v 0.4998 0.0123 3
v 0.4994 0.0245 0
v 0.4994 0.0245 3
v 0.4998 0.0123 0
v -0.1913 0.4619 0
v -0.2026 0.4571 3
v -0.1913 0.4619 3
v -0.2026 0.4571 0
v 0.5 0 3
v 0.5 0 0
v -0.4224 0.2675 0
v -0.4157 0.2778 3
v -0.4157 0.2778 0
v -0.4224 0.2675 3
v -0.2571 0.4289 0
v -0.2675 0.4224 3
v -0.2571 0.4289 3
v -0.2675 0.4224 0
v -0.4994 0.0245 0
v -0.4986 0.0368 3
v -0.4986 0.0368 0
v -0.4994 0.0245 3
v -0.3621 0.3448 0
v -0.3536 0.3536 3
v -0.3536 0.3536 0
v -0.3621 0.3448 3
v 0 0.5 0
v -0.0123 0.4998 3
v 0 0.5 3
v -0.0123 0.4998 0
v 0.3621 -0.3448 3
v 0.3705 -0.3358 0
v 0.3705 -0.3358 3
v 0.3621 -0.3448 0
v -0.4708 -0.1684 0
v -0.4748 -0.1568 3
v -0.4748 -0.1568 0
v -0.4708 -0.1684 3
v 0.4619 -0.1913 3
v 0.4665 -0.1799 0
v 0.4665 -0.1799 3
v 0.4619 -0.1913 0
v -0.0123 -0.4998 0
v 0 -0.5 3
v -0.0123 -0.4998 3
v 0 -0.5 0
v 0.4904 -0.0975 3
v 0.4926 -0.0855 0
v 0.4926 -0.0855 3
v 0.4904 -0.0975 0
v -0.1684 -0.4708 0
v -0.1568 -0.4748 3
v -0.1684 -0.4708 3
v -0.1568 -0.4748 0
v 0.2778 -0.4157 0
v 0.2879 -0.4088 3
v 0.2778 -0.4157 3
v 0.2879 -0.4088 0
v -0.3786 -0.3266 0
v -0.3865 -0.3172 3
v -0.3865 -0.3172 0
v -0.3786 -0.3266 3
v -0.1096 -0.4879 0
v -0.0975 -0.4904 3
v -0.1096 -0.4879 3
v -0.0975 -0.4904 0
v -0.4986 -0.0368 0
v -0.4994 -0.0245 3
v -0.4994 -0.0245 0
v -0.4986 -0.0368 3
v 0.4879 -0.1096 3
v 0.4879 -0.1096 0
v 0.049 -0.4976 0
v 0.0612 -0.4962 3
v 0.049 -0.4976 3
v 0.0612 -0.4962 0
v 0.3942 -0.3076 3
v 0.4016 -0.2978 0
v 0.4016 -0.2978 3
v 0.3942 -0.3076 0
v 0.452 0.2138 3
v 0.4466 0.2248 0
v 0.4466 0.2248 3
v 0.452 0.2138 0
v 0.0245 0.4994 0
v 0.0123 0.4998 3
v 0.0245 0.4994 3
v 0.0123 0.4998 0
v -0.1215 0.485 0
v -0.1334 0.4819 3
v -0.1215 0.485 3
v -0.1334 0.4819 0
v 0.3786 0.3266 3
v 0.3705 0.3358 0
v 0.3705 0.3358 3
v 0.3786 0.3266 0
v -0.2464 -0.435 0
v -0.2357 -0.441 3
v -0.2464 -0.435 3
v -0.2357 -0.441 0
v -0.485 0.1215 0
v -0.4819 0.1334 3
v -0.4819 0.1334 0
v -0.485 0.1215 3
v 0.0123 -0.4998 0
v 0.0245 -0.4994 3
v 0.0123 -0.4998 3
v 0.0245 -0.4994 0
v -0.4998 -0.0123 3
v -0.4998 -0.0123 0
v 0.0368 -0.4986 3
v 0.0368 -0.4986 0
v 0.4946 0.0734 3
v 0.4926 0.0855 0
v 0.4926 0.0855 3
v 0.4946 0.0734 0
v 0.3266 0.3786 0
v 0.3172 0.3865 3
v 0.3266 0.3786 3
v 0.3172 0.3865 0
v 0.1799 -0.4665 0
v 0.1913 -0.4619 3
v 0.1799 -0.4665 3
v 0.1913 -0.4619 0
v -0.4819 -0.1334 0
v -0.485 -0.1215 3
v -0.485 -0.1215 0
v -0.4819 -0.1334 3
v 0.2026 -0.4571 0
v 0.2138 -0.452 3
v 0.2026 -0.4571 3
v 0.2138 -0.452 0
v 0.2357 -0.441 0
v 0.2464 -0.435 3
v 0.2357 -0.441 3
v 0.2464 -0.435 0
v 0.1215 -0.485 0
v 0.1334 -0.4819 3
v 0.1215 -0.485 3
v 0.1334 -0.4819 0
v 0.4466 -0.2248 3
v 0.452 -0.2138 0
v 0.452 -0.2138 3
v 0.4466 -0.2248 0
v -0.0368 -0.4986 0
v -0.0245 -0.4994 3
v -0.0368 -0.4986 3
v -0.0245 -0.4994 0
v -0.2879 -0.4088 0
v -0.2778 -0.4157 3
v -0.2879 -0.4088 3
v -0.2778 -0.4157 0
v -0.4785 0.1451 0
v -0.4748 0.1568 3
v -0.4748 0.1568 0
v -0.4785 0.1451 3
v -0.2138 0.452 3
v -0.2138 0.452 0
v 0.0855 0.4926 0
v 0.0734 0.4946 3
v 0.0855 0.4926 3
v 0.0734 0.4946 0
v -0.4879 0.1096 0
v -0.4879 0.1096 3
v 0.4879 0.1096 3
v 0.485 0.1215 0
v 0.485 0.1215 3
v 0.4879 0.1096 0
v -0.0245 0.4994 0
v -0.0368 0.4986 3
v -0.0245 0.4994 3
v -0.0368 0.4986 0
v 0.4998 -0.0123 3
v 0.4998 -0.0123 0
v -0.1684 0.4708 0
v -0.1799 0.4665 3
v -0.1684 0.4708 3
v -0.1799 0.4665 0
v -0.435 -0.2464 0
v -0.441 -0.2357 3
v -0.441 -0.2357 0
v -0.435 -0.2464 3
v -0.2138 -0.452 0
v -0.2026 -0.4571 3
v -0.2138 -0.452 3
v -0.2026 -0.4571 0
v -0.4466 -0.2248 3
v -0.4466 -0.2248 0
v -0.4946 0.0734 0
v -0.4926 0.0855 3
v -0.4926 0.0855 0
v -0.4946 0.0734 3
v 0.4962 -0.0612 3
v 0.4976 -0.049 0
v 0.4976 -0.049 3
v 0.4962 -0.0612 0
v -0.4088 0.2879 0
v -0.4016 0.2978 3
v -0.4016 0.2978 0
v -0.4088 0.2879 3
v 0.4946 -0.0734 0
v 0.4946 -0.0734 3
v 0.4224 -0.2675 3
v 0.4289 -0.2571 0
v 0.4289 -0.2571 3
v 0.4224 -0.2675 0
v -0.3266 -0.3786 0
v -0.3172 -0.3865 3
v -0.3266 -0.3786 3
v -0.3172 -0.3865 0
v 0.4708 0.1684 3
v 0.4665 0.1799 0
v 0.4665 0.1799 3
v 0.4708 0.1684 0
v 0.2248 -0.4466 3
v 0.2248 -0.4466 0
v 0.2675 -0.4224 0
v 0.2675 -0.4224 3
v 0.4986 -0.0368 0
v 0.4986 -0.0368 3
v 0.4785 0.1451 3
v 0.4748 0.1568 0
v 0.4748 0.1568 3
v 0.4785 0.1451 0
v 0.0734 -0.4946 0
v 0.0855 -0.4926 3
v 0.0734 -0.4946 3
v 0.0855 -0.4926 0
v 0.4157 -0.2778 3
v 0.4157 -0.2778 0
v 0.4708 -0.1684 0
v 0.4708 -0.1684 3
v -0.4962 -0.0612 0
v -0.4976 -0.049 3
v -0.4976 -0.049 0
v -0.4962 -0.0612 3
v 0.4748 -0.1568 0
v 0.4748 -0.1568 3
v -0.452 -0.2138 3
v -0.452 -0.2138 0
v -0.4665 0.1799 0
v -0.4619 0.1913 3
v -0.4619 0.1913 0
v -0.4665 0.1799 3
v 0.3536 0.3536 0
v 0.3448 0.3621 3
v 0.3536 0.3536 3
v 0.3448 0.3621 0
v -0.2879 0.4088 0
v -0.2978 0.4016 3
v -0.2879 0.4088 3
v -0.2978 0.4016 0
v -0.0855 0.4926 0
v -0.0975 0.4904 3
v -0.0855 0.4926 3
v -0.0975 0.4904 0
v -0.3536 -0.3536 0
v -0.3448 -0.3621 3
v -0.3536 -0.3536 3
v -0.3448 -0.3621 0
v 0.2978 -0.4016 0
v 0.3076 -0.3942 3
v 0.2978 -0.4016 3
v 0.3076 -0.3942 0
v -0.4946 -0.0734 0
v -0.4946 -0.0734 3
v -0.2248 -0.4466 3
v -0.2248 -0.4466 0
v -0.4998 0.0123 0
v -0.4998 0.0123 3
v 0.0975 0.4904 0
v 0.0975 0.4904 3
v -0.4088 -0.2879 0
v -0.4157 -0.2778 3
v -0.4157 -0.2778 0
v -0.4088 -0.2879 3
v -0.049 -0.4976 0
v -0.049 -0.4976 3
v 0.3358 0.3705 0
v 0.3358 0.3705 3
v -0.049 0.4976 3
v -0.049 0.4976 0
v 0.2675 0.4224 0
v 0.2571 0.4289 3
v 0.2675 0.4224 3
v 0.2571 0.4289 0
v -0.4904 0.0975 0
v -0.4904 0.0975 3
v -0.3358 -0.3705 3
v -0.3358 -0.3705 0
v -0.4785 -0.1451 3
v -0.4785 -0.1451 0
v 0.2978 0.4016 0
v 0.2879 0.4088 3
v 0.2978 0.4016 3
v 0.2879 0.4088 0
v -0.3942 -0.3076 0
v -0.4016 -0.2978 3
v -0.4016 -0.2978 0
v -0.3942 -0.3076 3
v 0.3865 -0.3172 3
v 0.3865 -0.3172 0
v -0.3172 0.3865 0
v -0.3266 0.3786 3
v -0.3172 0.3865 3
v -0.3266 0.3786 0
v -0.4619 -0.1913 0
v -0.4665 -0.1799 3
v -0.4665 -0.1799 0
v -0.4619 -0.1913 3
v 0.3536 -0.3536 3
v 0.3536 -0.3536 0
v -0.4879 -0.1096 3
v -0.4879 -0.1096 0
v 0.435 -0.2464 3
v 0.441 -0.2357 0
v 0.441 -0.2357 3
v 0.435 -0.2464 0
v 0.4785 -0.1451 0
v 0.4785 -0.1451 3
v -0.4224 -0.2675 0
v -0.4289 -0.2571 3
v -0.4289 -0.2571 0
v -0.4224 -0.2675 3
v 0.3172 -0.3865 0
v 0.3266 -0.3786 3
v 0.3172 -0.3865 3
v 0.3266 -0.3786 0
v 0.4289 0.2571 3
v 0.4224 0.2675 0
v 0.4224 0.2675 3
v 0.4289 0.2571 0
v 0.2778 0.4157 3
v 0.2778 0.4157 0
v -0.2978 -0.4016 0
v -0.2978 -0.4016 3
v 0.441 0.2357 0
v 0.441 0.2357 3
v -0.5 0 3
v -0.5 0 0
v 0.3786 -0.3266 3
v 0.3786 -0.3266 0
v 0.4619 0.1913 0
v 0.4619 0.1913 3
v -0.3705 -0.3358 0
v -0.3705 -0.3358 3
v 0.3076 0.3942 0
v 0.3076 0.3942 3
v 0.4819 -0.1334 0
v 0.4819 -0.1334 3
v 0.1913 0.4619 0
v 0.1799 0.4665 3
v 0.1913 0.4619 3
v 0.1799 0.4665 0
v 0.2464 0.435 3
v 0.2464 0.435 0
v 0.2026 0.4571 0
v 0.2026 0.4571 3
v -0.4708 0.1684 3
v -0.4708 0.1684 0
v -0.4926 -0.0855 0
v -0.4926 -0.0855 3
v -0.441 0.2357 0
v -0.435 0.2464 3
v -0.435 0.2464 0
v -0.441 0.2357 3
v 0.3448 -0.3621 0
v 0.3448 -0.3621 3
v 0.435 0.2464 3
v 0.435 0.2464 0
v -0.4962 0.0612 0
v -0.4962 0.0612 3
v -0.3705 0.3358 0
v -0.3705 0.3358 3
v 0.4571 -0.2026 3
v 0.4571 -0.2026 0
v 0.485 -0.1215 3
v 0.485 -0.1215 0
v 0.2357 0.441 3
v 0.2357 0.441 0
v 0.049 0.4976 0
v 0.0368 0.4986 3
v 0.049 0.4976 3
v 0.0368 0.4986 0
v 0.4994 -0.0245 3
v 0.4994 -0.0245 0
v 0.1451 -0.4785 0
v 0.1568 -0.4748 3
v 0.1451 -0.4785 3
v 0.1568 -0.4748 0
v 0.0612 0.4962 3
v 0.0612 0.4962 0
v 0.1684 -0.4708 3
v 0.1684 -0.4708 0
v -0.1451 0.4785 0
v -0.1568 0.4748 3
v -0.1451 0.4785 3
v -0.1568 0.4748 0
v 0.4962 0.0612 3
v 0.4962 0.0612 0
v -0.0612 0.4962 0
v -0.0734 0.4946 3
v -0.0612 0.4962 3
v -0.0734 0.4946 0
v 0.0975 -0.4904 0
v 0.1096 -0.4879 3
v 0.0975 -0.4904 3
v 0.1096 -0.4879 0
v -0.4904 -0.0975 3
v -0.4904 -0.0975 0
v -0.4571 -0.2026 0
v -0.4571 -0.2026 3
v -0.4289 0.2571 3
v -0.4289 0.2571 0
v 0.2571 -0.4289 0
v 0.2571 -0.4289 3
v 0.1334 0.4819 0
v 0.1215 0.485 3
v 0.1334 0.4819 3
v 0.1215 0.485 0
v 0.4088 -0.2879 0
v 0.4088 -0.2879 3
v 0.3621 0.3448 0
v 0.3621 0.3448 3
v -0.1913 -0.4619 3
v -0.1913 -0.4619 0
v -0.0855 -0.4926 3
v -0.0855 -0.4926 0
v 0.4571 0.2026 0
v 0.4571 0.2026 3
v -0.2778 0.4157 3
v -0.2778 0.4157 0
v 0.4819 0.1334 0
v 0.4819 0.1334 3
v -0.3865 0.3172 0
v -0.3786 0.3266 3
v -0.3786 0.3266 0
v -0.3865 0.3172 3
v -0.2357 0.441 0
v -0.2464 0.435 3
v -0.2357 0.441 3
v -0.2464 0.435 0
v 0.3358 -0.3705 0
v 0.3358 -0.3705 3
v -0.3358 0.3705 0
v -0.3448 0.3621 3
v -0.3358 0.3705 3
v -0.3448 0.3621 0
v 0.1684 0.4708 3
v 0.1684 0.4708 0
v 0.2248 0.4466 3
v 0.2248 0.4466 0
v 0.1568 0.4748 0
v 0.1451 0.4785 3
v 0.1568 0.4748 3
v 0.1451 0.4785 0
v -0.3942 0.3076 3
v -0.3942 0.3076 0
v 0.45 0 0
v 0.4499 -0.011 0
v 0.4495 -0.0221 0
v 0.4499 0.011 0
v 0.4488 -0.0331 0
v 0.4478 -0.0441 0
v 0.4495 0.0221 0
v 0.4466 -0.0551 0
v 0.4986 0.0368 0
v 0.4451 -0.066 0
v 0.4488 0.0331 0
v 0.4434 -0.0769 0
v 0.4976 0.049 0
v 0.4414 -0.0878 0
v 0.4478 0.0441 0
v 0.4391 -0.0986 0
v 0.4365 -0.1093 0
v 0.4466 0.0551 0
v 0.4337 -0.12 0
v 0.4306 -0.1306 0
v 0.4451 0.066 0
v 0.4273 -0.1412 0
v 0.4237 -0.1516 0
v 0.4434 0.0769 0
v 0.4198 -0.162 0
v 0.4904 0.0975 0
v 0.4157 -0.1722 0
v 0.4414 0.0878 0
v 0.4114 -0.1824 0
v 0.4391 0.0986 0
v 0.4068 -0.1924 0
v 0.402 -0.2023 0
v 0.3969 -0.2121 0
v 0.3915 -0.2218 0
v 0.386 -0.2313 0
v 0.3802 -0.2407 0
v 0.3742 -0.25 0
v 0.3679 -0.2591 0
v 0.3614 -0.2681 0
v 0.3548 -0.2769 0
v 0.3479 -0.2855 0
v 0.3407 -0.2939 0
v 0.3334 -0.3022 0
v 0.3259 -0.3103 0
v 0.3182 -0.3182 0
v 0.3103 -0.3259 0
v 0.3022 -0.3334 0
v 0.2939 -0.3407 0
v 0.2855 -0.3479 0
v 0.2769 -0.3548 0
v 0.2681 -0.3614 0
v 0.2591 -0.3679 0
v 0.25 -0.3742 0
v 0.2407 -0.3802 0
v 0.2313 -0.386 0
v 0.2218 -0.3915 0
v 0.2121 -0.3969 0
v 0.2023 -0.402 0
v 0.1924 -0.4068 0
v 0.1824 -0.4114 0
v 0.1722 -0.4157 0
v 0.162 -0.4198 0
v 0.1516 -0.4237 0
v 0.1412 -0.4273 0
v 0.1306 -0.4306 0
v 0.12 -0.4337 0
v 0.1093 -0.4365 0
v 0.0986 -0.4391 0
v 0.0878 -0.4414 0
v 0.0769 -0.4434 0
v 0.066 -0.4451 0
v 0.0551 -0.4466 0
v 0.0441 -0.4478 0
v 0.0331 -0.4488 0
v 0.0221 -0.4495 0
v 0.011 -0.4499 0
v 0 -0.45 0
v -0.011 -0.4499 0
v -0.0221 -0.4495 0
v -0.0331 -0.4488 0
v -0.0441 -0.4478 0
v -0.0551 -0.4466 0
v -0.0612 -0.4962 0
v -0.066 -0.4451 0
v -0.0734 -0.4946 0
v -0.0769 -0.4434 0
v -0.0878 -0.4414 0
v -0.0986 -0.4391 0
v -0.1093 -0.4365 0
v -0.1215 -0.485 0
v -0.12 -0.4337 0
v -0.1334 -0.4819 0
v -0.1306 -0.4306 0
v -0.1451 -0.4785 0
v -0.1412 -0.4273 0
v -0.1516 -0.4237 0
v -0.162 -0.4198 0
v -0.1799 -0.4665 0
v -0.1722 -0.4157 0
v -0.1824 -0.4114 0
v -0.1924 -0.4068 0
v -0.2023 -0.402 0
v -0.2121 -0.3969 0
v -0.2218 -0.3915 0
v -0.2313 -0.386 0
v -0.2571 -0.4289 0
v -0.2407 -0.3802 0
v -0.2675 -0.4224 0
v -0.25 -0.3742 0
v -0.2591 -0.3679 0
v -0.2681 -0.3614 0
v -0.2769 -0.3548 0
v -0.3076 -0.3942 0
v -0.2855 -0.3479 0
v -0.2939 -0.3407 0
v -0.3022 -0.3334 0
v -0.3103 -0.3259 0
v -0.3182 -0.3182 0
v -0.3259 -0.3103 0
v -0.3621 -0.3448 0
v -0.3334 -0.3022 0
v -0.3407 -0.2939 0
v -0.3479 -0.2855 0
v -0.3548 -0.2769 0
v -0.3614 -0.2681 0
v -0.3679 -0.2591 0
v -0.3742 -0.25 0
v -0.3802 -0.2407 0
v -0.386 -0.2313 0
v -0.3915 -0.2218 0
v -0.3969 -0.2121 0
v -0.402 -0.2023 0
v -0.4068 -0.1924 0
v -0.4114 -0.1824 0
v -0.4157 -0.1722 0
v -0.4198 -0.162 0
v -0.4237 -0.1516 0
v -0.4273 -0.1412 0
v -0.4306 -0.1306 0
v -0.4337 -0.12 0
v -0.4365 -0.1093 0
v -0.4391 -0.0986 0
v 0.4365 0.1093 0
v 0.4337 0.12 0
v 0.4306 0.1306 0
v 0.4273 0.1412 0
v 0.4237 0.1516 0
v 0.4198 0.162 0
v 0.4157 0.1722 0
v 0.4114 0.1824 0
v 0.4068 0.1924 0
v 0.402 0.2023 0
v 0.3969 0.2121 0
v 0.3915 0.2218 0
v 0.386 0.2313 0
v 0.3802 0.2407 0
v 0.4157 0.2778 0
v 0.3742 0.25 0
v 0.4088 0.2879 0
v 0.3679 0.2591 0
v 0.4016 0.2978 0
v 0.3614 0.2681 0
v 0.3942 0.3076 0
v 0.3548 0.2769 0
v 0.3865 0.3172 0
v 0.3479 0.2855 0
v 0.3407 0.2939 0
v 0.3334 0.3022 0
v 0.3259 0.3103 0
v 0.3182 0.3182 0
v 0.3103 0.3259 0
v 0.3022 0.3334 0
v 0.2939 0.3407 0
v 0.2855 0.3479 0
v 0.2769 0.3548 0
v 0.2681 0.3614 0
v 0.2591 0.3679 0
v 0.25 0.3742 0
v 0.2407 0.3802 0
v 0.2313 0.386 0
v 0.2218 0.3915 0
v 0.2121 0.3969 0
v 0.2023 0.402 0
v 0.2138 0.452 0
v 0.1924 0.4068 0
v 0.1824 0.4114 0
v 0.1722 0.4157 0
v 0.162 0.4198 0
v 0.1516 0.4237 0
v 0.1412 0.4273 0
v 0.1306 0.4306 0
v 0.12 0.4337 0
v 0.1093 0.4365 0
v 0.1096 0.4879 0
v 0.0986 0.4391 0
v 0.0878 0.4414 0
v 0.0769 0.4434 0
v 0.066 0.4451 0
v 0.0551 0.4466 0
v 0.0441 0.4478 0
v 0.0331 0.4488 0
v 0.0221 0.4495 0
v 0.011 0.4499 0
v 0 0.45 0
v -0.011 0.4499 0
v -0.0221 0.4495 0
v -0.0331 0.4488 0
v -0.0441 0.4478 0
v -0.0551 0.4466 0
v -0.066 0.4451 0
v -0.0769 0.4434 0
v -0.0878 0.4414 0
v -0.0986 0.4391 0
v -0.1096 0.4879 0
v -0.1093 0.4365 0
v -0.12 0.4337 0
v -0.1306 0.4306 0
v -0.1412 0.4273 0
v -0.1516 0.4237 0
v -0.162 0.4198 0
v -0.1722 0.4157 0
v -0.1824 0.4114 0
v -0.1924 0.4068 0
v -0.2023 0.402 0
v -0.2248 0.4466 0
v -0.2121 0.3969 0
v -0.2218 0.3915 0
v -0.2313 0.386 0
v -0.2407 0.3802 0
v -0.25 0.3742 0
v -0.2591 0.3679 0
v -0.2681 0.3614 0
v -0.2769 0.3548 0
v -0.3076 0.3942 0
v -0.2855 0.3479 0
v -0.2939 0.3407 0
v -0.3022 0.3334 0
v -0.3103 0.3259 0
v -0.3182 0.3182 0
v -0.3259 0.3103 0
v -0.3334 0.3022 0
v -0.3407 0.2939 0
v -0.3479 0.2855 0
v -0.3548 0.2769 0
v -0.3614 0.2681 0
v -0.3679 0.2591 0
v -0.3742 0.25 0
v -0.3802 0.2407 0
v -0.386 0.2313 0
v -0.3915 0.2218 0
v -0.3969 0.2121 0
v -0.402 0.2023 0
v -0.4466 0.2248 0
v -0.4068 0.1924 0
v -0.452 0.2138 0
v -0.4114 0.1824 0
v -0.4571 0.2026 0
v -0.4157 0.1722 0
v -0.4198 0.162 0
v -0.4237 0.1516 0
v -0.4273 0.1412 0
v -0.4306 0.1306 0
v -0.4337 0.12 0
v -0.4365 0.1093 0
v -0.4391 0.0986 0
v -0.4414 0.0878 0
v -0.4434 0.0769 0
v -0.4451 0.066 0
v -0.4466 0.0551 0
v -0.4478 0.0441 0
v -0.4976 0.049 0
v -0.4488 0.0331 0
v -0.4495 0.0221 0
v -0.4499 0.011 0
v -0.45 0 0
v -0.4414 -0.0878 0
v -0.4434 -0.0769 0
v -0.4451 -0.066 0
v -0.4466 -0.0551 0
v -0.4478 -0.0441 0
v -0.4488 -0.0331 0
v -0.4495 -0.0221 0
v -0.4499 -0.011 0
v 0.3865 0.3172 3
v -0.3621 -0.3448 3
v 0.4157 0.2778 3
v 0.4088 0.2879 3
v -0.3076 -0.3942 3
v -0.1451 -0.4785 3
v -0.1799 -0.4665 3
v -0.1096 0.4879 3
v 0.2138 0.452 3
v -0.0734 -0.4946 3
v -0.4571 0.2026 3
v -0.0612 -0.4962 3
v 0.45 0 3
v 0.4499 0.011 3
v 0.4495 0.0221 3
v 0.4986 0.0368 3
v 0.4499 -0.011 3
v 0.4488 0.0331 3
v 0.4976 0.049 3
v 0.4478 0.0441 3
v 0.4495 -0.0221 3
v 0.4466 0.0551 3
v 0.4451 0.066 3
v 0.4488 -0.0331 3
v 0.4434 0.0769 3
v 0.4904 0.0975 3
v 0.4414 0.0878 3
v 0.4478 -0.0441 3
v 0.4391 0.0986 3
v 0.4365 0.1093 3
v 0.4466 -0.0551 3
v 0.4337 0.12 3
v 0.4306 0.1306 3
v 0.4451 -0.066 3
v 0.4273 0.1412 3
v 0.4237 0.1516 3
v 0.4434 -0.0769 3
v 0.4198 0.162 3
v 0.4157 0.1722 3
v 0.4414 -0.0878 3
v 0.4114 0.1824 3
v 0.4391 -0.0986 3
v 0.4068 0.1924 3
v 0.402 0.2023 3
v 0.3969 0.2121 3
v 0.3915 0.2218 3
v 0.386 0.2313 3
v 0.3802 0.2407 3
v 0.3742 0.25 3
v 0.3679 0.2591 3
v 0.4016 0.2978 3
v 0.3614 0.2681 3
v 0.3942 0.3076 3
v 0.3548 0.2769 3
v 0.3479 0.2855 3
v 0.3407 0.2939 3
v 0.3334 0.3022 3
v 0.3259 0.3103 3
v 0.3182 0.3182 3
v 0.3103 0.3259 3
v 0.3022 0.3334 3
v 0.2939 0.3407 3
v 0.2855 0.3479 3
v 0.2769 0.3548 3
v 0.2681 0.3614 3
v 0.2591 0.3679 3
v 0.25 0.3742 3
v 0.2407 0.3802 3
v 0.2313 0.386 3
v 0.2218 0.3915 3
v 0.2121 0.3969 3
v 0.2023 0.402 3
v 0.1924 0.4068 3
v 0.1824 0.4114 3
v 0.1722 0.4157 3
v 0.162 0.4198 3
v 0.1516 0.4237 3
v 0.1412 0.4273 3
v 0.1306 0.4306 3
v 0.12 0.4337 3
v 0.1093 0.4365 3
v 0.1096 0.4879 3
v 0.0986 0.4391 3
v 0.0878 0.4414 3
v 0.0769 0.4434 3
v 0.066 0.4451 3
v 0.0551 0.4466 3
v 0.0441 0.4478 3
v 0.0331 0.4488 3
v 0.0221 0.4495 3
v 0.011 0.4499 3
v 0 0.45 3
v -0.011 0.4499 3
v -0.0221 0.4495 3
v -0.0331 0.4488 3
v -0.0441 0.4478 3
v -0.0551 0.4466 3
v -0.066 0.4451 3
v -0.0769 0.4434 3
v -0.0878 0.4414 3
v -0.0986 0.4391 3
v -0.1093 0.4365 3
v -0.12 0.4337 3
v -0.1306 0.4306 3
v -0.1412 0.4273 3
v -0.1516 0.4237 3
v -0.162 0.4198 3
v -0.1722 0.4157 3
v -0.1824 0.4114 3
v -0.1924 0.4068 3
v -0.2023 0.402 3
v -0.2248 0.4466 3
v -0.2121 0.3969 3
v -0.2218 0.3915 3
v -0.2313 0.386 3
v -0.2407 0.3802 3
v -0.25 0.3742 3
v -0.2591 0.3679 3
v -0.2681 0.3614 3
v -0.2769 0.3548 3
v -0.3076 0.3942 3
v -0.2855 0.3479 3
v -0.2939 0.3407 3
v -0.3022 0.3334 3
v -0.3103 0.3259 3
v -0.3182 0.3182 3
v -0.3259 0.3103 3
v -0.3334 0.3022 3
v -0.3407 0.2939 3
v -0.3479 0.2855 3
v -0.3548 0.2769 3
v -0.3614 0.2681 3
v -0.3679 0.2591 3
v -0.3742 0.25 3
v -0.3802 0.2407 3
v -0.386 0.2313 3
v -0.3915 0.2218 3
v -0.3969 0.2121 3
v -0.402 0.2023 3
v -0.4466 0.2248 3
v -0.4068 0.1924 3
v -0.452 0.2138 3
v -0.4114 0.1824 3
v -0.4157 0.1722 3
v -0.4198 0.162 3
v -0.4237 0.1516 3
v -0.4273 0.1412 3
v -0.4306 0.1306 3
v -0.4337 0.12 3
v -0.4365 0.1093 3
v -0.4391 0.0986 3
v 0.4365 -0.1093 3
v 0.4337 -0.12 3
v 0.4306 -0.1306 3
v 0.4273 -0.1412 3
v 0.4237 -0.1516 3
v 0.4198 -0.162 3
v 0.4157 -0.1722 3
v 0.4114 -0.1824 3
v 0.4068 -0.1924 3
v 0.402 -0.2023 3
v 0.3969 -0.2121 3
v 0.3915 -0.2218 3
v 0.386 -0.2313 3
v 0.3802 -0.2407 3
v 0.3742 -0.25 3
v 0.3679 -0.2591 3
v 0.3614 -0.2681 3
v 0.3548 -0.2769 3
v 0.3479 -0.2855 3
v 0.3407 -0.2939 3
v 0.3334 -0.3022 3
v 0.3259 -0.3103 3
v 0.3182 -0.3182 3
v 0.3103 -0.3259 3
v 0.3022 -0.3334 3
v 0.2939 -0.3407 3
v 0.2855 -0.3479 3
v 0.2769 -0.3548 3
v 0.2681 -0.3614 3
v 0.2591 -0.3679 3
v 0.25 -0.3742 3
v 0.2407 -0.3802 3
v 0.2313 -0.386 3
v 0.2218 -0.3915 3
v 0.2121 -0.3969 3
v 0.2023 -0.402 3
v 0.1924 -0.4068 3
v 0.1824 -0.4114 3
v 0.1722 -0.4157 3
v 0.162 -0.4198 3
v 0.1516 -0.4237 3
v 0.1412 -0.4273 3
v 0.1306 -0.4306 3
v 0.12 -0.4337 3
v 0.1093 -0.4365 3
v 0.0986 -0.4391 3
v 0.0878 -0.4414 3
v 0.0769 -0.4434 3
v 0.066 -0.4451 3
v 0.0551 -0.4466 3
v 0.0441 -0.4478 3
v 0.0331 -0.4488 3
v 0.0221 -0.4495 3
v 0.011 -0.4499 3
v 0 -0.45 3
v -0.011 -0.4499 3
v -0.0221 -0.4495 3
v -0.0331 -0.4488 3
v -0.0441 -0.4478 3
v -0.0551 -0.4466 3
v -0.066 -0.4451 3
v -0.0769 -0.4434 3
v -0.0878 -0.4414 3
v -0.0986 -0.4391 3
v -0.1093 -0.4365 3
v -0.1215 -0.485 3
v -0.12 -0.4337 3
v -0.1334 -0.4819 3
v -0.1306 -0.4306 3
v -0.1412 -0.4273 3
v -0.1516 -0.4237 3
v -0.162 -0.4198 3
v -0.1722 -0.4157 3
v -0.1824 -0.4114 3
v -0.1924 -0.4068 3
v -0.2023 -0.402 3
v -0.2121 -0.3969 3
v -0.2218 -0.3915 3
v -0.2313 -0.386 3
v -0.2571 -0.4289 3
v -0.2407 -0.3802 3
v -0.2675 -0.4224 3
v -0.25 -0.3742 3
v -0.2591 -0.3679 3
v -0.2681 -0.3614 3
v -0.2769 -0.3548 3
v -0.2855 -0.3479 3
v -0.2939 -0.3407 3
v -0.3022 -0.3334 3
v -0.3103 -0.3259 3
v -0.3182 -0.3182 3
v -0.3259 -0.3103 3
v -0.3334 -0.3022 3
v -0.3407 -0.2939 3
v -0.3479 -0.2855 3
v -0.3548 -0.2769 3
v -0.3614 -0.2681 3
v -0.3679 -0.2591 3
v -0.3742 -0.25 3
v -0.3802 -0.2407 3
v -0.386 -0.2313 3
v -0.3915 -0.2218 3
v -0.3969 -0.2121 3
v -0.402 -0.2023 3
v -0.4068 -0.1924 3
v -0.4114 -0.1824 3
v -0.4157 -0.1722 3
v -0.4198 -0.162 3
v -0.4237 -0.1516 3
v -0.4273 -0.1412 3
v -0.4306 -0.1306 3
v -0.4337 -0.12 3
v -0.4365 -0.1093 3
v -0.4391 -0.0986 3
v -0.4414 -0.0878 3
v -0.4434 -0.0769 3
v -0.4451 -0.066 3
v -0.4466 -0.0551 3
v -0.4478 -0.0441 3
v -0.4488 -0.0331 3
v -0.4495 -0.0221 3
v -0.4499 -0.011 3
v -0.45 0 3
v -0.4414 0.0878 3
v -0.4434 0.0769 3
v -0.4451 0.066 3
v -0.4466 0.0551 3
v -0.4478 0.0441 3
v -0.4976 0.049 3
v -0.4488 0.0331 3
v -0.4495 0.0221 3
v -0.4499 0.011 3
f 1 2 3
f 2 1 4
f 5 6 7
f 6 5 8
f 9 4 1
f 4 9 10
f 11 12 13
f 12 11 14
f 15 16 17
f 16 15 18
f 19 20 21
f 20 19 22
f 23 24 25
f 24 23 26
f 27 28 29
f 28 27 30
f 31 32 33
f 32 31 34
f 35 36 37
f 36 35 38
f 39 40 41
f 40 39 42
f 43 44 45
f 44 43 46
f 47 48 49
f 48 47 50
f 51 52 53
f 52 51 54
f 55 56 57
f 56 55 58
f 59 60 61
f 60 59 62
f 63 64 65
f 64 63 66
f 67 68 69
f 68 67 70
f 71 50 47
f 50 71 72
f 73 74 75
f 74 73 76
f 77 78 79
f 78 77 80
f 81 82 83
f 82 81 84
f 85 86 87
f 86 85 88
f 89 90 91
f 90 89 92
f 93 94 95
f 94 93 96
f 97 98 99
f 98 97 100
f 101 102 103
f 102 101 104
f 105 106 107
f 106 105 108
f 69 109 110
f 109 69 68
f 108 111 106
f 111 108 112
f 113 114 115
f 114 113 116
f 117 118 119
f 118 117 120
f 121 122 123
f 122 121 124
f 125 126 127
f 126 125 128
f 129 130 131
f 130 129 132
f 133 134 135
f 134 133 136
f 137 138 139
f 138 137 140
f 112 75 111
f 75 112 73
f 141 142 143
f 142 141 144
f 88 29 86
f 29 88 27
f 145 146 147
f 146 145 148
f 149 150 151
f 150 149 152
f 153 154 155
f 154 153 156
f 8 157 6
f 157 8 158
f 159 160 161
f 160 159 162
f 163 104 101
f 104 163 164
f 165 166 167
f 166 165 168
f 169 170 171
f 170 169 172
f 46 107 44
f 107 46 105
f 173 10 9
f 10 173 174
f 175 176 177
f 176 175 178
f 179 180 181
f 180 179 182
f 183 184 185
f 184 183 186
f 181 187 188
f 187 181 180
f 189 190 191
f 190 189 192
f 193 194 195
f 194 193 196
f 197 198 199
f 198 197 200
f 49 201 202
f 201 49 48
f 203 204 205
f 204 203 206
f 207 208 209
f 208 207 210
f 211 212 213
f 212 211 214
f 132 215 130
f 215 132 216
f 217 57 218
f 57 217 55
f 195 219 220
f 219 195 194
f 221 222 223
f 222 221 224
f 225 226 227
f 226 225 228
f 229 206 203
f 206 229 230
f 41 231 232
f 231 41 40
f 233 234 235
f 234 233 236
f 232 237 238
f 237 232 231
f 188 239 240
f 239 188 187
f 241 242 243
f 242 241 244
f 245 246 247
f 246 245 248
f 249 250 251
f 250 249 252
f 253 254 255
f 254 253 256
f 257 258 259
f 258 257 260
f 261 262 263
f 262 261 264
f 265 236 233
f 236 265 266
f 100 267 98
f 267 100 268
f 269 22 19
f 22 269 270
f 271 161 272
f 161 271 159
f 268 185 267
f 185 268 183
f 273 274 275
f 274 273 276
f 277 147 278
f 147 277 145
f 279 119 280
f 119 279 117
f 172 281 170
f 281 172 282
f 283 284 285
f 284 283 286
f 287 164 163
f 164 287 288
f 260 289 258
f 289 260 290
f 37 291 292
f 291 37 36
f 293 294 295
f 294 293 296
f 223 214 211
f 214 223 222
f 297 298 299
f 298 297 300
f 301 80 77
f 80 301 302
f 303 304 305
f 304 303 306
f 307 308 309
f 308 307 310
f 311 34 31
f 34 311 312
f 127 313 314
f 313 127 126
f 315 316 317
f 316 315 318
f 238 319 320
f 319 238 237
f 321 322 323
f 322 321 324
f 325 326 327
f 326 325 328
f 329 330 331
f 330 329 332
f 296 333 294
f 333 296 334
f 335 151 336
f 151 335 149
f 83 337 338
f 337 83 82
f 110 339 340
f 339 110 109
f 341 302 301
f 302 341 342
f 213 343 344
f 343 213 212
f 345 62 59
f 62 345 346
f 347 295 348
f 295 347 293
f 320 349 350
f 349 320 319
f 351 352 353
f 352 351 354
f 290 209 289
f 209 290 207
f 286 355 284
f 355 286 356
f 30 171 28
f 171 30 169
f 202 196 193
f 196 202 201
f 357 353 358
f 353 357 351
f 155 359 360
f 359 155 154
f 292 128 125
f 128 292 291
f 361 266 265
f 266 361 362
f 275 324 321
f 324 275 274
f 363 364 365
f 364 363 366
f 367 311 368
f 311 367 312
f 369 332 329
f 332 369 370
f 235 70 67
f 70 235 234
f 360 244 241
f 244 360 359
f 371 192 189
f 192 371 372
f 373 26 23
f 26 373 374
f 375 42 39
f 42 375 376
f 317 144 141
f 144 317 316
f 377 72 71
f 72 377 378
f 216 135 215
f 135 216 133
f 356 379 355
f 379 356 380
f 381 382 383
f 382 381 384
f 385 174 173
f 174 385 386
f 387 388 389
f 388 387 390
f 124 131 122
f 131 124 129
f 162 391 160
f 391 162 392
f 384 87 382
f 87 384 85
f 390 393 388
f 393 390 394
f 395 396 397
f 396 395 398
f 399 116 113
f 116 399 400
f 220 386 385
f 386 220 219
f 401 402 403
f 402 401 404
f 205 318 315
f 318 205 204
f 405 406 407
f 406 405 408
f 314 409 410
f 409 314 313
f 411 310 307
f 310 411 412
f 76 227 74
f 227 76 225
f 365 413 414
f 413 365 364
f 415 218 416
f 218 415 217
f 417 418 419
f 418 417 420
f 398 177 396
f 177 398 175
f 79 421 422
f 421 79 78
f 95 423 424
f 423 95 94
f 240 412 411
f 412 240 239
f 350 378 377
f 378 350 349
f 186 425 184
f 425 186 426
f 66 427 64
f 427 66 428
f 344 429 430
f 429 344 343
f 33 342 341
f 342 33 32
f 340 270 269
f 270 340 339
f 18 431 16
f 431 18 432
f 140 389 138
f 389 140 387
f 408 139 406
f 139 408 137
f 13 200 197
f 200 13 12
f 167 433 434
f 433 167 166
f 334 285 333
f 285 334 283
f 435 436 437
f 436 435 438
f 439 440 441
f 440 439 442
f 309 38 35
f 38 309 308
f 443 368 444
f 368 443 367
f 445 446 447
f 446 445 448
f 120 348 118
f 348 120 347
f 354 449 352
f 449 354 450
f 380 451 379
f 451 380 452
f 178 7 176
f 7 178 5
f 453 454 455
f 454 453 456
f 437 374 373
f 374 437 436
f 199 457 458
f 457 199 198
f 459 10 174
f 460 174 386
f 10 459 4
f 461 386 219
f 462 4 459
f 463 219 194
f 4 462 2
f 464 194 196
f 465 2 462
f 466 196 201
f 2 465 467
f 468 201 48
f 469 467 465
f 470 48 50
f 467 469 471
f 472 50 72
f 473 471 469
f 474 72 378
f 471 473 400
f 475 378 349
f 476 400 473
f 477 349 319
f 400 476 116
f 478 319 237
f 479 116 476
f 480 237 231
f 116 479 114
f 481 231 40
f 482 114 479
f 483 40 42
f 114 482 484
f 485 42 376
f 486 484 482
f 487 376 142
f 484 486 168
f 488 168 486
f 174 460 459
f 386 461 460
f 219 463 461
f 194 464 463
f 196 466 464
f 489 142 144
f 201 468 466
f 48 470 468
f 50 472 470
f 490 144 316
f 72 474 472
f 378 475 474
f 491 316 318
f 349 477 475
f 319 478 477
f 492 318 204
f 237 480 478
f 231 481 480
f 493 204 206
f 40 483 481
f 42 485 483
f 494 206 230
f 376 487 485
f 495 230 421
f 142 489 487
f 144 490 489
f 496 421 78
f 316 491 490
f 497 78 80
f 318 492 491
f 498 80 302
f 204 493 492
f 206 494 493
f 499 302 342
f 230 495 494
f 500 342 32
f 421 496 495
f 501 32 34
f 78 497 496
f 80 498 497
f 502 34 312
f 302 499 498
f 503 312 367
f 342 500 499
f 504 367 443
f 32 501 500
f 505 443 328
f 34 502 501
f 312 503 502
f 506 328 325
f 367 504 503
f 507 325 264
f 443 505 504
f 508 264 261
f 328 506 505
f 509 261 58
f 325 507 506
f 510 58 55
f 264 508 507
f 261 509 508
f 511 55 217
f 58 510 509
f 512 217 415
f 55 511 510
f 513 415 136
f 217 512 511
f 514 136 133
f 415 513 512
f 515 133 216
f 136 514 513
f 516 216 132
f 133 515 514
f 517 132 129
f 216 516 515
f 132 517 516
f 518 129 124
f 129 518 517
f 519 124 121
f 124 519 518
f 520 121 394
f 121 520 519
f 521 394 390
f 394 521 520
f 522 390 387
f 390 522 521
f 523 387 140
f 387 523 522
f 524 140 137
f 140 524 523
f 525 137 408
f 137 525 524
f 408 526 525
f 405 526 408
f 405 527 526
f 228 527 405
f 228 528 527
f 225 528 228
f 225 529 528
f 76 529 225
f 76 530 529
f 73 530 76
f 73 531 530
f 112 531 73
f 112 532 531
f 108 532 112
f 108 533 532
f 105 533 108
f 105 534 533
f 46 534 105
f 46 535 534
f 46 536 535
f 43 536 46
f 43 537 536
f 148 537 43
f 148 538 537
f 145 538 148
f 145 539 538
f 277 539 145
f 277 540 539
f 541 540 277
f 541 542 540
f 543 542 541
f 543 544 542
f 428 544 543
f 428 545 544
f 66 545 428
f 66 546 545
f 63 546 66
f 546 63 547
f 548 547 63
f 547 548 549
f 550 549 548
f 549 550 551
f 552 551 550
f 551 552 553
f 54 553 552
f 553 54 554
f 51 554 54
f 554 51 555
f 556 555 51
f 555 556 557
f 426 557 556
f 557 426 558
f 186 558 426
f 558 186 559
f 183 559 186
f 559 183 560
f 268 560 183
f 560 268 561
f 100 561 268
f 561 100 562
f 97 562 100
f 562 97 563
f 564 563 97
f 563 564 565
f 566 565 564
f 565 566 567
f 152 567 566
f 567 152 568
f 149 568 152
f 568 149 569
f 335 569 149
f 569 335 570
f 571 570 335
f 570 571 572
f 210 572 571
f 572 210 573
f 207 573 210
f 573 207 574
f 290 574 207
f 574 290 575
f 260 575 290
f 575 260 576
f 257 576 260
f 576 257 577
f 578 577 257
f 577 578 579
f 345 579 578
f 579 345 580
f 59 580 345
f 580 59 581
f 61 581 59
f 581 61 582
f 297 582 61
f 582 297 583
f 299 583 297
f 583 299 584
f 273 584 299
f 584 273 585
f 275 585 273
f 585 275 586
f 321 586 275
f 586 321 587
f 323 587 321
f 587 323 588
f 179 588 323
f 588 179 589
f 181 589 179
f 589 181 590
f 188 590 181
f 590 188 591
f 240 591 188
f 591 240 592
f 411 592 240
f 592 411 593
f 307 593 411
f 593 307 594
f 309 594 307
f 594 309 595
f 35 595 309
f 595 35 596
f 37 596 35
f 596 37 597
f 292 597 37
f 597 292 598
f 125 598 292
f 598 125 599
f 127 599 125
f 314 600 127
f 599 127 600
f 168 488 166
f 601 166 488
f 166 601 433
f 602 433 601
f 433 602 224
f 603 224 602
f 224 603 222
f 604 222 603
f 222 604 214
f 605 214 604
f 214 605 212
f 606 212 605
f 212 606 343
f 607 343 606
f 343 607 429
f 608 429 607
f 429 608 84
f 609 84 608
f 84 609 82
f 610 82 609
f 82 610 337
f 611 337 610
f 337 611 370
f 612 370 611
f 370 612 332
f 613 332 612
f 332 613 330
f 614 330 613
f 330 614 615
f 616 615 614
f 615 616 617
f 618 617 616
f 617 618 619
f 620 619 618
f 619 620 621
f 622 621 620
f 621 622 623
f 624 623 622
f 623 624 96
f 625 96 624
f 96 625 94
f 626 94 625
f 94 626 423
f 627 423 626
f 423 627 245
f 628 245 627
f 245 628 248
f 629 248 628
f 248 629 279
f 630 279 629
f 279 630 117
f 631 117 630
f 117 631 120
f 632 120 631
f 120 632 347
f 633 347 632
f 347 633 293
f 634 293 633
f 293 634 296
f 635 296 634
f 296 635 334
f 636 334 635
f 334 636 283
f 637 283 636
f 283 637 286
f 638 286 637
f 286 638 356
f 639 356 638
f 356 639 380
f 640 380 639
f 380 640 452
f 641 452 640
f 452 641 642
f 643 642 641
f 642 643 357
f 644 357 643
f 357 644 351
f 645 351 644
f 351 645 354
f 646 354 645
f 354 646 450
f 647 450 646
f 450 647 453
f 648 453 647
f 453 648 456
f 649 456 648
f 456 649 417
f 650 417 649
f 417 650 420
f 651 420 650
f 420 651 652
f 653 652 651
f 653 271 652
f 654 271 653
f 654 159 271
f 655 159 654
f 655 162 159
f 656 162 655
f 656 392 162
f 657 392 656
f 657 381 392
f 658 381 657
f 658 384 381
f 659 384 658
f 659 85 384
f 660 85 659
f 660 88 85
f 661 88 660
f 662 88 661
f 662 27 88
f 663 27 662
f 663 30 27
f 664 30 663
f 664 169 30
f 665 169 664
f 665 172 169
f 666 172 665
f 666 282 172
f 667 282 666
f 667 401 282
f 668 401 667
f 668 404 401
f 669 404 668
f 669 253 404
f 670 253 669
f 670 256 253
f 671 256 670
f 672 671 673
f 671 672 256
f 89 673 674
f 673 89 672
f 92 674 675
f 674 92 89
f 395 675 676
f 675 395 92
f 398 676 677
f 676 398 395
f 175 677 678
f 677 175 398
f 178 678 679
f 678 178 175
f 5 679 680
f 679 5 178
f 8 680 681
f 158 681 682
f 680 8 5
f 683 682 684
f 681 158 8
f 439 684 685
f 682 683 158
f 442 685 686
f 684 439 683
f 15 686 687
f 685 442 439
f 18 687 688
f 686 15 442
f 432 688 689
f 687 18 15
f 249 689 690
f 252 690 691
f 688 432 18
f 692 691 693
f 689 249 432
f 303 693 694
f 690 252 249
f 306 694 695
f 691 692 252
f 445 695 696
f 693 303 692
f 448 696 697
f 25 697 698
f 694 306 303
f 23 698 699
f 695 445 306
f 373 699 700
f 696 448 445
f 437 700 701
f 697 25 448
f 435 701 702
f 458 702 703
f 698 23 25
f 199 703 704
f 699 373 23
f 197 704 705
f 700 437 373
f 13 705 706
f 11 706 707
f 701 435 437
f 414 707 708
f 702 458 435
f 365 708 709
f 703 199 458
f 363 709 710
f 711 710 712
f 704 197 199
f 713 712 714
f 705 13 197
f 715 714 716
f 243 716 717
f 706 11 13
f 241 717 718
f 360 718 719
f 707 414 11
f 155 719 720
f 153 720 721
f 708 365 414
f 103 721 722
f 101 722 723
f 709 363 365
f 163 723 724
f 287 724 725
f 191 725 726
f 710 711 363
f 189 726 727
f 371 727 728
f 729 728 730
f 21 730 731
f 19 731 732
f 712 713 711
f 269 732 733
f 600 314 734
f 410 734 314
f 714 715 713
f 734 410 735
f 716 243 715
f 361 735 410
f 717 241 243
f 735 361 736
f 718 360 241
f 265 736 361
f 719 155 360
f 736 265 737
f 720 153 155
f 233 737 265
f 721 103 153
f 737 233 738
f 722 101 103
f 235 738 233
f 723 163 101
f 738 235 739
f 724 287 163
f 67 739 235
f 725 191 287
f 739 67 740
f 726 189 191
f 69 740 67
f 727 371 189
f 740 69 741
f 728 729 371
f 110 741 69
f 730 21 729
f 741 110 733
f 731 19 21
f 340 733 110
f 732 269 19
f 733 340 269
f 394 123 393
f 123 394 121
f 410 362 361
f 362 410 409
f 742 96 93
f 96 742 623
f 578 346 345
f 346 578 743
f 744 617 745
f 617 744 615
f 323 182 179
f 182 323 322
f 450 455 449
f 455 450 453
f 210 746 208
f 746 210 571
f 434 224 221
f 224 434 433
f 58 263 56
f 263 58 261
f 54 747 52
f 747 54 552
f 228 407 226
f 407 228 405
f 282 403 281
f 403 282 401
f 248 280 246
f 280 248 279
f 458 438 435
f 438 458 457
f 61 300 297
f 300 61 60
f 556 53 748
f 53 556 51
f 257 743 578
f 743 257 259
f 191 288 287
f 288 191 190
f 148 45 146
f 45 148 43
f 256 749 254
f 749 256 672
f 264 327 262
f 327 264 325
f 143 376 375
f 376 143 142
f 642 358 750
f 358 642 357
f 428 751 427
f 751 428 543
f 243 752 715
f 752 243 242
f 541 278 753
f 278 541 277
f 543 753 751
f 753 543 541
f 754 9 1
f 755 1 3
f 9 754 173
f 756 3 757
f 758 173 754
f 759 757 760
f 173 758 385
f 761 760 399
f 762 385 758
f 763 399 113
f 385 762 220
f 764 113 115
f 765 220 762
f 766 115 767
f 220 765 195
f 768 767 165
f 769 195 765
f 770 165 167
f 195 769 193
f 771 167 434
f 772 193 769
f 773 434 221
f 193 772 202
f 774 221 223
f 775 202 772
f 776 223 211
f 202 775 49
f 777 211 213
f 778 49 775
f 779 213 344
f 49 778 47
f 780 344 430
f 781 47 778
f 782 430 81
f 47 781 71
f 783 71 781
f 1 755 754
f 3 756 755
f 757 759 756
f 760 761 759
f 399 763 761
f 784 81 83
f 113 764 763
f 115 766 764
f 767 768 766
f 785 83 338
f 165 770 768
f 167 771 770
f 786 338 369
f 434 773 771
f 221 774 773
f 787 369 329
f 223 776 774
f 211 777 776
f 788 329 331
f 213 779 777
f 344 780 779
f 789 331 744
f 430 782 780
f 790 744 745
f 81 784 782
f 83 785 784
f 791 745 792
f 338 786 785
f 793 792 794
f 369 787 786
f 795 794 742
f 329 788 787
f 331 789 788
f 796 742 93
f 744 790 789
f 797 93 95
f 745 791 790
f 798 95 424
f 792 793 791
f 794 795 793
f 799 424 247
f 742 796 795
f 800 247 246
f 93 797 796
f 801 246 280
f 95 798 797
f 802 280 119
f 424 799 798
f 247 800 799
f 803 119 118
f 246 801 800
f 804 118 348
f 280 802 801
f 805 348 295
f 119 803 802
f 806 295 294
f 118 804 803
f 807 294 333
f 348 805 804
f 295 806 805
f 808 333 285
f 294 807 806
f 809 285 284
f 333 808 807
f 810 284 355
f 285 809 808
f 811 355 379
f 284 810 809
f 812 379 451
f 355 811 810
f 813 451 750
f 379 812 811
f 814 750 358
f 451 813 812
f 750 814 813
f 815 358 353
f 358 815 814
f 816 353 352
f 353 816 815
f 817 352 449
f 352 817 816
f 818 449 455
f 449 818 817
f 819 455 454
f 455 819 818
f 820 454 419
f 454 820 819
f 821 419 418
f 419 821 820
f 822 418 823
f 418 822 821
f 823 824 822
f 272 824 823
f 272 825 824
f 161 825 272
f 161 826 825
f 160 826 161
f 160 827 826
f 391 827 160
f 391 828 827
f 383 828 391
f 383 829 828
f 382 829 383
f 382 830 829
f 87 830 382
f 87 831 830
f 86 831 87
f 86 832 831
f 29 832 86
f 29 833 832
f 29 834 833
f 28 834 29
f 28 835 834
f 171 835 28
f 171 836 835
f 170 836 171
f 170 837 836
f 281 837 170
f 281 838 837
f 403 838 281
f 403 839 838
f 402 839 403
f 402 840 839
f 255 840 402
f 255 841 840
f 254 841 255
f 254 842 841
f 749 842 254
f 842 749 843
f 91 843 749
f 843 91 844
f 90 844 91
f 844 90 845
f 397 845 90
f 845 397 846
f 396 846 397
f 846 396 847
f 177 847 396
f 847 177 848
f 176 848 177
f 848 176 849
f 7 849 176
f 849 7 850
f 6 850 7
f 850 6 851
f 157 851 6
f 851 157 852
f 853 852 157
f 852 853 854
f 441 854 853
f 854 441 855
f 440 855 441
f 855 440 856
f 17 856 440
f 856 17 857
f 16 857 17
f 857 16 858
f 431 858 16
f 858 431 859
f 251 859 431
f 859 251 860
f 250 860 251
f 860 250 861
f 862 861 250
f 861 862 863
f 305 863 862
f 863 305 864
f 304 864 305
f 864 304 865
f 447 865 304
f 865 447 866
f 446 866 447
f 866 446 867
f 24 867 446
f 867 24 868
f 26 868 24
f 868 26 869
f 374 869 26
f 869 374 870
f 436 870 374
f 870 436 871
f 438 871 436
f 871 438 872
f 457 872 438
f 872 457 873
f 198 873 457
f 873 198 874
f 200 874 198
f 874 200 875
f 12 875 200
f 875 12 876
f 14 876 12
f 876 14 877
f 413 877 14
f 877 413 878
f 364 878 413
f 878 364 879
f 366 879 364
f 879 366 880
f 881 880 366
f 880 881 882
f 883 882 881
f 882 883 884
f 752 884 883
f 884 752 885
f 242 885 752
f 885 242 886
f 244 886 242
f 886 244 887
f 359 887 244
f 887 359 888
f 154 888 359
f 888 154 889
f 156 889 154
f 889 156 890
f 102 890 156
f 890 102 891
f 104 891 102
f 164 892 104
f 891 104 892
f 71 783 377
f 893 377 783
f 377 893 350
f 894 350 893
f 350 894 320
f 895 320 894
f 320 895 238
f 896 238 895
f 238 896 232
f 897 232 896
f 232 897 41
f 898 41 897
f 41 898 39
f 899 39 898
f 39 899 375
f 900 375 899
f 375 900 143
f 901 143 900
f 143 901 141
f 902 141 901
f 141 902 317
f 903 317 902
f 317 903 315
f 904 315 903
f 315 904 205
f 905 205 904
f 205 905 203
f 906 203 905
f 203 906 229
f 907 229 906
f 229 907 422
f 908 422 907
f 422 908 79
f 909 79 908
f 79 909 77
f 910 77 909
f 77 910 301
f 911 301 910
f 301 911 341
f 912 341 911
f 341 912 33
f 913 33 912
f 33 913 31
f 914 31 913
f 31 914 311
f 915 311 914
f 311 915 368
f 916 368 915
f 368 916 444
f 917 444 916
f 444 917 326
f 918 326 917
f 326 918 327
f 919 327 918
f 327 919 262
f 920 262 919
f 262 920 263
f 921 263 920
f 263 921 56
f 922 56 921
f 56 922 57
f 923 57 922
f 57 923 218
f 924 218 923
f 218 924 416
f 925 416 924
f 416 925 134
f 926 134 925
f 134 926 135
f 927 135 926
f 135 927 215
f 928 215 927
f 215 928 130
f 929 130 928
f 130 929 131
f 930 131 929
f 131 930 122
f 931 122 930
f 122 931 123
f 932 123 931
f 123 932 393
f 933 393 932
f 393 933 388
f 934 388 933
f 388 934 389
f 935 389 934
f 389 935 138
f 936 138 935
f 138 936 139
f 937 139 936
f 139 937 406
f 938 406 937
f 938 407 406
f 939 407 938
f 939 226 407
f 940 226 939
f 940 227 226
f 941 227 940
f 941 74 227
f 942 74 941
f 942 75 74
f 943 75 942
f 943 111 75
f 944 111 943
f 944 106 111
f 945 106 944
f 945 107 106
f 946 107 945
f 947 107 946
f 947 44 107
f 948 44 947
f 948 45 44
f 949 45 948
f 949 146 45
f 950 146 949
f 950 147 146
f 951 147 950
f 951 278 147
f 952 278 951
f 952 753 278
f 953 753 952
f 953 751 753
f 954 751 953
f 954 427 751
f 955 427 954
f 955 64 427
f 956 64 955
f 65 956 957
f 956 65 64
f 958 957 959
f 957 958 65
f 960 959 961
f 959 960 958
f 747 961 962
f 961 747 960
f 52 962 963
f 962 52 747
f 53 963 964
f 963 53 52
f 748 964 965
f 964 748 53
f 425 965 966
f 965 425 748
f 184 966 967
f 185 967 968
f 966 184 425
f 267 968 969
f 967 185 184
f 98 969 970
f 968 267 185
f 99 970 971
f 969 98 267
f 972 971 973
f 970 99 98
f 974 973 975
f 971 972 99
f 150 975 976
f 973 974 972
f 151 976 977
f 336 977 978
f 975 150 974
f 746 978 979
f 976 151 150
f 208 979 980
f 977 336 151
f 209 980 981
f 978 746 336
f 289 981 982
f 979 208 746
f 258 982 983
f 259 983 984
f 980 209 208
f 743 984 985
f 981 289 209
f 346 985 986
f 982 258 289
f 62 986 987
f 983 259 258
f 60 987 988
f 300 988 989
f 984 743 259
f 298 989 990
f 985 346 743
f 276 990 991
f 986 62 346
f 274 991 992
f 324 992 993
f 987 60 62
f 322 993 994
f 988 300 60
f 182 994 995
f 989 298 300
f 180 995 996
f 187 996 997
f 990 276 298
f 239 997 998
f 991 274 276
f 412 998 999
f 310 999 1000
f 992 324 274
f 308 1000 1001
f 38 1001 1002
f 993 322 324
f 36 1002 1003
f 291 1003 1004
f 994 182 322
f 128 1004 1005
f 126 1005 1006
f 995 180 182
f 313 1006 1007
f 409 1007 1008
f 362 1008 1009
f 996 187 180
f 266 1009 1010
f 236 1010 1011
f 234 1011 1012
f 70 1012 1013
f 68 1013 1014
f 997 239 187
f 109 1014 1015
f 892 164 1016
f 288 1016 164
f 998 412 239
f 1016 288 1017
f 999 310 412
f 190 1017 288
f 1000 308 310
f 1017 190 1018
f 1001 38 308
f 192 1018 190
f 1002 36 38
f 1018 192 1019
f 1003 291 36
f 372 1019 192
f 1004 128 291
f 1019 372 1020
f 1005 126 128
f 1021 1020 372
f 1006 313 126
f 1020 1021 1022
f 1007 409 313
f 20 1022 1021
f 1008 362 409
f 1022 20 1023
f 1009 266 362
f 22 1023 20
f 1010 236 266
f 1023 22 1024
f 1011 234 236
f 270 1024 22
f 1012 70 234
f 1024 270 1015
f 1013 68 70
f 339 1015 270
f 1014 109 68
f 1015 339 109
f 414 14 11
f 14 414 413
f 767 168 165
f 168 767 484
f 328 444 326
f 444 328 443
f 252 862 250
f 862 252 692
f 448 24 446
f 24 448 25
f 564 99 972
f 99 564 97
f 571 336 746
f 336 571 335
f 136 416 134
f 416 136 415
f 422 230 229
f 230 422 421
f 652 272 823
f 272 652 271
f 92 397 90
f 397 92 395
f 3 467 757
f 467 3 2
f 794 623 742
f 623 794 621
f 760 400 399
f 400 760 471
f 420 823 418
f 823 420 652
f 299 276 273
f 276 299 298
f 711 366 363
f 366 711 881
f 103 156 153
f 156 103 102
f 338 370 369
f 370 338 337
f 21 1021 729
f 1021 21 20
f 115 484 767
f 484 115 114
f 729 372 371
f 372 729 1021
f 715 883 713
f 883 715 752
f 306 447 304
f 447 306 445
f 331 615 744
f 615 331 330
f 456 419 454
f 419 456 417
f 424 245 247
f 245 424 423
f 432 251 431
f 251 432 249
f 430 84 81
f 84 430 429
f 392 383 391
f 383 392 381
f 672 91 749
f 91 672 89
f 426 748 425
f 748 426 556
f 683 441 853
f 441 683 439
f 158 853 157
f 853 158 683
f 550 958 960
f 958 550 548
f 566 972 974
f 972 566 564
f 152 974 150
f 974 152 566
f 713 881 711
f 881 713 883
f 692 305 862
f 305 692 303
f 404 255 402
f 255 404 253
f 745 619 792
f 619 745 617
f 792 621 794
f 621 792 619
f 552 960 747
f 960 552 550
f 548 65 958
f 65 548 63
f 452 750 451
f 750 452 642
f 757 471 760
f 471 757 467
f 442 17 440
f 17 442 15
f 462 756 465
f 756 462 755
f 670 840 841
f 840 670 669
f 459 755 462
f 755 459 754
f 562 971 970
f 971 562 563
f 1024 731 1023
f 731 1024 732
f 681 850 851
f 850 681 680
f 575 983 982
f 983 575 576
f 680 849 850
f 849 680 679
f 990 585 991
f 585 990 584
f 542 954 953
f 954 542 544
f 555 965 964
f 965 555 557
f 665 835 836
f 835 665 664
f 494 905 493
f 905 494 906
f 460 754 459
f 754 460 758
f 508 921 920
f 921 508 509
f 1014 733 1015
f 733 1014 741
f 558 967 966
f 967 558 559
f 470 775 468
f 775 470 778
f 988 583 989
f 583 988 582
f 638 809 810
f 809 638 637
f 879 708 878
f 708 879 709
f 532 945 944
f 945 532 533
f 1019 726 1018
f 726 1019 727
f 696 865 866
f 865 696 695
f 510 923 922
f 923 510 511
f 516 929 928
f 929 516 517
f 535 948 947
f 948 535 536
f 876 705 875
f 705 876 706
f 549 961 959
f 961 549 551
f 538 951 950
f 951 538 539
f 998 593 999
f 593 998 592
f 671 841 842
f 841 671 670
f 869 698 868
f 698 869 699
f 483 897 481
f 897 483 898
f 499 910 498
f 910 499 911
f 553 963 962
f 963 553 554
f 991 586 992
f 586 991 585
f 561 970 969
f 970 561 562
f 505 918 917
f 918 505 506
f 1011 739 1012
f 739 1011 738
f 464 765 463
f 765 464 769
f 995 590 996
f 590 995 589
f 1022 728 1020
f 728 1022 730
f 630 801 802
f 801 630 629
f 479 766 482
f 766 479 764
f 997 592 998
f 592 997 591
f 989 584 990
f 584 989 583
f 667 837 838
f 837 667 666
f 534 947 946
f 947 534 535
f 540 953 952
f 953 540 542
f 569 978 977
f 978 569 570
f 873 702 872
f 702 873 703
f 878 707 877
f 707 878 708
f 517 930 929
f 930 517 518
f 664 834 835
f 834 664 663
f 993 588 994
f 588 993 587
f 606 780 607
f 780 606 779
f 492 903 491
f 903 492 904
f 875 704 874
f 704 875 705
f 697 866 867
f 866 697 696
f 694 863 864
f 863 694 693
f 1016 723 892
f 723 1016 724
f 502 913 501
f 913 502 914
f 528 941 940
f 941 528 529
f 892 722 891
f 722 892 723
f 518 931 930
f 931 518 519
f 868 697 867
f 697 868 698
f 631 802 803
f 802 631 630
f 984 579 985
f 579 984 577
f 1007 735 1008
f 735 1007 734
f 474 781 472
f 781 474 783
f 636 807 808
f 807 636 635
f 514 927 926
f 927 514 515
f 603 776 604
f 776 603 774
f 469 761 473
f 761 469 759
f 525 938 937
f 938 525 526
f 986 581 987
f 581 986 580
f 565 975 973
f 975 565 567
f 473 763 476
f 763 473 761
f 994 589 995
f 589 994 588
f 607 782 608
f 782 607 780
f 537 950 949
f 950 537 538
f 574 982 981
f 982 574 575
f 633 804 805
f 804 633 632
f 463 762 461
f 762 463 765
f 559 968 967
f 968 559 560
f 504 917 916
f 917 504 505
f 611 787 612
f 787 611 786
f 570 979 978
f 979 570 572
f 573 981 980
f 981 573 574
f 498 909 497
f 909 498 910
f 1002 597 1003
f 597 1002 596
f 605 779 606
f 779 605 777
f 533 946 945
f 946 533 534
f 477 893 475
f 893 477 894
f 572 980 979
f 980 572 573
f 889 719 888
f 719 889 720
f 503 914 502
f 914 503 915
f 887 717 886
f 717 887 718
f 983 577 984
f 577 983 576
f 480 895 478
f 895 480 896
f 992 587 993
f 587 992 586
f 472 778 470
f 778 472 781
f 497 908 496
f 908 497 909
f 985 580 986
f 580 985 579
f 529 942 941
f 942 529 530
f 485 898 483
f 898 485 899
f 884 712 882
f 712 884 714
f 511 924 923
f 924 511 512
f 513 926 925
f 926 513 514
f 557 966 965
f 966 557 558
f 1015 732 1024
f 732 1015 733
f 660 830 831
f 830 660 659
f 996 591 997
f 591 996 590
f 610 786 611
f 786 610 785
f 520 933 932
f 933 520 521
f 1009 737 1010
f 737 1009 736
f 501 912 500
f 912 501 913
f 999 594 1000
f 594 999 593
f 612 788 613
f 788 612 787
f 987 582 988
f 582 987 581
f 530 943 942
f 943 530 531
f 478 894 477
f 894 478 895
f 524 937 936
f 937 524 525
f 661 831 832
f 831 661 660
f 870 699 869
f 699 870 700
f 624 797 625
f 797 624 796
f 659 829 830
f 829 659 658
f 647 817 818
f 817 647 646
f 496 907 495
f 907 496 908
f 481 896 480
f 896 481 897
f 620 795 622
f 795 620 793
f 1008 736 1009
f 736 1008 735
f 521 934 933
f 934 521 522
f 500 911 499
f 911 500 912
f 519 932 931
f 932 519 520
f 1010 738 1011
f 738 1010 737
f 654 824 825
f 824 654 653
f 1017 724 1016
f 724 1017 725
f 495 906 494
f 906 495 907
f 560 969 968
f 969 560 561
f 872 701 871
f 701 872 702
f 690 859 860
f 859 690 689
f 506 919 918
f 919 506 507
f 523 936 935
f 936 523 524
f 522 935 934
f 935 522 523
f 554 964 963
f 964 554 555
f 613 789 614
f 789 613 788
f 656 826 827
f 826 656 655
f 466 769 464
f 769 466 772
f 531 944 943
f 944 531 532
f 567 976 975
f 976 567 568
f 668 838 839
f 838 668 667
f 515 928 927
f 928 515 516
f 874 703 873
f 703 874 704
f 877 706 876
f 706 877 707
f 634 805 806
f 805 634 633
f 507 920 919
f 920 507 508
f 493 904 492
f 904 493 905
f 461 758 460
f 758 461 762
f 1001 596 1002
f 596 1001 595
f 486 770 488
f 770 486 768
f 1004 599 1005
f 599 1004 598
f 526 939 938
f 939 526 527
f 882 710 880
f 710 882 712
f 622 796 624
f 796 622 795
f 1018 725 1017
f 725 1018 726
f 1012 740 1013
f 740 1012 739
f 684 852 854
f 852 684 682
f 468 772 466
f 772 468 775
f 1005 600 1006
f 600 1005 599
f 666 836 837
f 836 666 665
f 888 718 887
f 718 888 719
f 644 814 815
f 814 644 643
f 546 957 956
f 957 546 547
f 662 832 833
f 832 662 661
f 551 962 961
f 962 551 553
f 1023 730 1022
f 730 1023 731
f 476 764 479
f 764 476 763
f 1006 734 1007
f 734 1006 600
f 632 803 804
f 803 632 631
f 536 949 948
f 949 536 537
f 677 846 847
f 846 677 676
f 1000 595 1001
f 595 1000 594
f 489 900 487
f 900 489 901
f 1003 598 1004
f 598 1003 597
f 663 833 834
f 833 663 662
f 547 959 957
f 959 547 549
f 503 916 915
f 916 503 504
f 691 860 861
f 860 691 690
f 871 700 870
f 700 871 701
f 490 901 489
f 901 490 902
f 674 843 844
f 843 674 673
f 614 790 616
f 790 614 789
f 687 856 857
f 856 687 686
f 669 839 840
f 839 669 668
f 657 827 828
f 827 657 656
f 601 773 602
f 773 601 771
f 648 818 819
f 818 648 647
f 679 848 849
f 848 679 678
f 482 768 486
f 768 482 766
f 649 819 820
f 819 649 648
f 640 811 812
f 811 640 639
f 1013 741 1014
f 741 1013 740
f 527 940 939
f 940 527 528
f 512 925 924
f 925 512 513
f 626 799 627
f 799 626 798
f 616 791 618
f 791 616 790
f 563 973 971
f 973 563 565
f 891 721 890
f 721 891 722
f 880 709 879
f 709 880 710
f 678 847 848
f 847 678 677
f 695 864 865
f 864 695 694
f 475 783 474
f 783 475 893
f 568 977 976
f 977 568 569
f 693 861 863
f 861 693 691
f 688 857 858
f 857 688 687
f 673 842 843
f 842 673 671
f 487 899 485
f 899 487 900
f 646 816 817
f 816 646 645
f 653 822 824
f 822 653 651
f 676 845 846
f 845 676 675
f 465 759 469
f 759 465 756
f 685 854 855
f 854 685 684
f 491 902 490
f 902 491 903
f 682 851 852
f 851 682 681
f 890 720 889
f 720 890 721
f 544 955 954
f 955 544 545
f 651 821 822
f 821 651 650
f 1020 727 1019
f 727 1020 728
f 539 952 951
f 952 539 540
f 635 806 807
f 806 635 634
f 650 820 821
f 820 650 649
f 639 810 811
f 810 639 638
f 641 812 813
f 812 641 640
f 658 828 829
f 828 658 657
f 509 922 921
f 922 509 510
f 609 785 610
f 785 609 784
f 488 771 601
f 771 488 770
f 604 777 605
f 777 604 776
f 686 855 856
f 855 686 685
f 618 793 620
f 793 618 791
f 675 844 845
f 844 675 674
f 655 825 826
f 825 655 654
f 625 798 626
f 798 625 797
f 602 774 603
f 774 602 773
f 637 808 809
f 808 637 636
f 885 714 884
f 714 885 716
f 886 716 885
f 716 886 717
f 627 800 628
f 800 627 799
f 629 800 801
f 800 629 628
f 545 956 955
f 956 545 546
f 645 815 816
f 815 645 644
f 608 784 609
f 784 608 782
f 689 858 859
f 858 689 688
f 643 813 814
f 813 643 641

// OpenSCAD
// Tube (Narrow) for Stacks of Shapes
// by Slashee the Cow
$fn = 256;

color("MediumVioletRed")
difference(){
    linear_extrude(3)
        circle(d=1);
    linear_extrude(4)
        circle(d=0.9);
}
